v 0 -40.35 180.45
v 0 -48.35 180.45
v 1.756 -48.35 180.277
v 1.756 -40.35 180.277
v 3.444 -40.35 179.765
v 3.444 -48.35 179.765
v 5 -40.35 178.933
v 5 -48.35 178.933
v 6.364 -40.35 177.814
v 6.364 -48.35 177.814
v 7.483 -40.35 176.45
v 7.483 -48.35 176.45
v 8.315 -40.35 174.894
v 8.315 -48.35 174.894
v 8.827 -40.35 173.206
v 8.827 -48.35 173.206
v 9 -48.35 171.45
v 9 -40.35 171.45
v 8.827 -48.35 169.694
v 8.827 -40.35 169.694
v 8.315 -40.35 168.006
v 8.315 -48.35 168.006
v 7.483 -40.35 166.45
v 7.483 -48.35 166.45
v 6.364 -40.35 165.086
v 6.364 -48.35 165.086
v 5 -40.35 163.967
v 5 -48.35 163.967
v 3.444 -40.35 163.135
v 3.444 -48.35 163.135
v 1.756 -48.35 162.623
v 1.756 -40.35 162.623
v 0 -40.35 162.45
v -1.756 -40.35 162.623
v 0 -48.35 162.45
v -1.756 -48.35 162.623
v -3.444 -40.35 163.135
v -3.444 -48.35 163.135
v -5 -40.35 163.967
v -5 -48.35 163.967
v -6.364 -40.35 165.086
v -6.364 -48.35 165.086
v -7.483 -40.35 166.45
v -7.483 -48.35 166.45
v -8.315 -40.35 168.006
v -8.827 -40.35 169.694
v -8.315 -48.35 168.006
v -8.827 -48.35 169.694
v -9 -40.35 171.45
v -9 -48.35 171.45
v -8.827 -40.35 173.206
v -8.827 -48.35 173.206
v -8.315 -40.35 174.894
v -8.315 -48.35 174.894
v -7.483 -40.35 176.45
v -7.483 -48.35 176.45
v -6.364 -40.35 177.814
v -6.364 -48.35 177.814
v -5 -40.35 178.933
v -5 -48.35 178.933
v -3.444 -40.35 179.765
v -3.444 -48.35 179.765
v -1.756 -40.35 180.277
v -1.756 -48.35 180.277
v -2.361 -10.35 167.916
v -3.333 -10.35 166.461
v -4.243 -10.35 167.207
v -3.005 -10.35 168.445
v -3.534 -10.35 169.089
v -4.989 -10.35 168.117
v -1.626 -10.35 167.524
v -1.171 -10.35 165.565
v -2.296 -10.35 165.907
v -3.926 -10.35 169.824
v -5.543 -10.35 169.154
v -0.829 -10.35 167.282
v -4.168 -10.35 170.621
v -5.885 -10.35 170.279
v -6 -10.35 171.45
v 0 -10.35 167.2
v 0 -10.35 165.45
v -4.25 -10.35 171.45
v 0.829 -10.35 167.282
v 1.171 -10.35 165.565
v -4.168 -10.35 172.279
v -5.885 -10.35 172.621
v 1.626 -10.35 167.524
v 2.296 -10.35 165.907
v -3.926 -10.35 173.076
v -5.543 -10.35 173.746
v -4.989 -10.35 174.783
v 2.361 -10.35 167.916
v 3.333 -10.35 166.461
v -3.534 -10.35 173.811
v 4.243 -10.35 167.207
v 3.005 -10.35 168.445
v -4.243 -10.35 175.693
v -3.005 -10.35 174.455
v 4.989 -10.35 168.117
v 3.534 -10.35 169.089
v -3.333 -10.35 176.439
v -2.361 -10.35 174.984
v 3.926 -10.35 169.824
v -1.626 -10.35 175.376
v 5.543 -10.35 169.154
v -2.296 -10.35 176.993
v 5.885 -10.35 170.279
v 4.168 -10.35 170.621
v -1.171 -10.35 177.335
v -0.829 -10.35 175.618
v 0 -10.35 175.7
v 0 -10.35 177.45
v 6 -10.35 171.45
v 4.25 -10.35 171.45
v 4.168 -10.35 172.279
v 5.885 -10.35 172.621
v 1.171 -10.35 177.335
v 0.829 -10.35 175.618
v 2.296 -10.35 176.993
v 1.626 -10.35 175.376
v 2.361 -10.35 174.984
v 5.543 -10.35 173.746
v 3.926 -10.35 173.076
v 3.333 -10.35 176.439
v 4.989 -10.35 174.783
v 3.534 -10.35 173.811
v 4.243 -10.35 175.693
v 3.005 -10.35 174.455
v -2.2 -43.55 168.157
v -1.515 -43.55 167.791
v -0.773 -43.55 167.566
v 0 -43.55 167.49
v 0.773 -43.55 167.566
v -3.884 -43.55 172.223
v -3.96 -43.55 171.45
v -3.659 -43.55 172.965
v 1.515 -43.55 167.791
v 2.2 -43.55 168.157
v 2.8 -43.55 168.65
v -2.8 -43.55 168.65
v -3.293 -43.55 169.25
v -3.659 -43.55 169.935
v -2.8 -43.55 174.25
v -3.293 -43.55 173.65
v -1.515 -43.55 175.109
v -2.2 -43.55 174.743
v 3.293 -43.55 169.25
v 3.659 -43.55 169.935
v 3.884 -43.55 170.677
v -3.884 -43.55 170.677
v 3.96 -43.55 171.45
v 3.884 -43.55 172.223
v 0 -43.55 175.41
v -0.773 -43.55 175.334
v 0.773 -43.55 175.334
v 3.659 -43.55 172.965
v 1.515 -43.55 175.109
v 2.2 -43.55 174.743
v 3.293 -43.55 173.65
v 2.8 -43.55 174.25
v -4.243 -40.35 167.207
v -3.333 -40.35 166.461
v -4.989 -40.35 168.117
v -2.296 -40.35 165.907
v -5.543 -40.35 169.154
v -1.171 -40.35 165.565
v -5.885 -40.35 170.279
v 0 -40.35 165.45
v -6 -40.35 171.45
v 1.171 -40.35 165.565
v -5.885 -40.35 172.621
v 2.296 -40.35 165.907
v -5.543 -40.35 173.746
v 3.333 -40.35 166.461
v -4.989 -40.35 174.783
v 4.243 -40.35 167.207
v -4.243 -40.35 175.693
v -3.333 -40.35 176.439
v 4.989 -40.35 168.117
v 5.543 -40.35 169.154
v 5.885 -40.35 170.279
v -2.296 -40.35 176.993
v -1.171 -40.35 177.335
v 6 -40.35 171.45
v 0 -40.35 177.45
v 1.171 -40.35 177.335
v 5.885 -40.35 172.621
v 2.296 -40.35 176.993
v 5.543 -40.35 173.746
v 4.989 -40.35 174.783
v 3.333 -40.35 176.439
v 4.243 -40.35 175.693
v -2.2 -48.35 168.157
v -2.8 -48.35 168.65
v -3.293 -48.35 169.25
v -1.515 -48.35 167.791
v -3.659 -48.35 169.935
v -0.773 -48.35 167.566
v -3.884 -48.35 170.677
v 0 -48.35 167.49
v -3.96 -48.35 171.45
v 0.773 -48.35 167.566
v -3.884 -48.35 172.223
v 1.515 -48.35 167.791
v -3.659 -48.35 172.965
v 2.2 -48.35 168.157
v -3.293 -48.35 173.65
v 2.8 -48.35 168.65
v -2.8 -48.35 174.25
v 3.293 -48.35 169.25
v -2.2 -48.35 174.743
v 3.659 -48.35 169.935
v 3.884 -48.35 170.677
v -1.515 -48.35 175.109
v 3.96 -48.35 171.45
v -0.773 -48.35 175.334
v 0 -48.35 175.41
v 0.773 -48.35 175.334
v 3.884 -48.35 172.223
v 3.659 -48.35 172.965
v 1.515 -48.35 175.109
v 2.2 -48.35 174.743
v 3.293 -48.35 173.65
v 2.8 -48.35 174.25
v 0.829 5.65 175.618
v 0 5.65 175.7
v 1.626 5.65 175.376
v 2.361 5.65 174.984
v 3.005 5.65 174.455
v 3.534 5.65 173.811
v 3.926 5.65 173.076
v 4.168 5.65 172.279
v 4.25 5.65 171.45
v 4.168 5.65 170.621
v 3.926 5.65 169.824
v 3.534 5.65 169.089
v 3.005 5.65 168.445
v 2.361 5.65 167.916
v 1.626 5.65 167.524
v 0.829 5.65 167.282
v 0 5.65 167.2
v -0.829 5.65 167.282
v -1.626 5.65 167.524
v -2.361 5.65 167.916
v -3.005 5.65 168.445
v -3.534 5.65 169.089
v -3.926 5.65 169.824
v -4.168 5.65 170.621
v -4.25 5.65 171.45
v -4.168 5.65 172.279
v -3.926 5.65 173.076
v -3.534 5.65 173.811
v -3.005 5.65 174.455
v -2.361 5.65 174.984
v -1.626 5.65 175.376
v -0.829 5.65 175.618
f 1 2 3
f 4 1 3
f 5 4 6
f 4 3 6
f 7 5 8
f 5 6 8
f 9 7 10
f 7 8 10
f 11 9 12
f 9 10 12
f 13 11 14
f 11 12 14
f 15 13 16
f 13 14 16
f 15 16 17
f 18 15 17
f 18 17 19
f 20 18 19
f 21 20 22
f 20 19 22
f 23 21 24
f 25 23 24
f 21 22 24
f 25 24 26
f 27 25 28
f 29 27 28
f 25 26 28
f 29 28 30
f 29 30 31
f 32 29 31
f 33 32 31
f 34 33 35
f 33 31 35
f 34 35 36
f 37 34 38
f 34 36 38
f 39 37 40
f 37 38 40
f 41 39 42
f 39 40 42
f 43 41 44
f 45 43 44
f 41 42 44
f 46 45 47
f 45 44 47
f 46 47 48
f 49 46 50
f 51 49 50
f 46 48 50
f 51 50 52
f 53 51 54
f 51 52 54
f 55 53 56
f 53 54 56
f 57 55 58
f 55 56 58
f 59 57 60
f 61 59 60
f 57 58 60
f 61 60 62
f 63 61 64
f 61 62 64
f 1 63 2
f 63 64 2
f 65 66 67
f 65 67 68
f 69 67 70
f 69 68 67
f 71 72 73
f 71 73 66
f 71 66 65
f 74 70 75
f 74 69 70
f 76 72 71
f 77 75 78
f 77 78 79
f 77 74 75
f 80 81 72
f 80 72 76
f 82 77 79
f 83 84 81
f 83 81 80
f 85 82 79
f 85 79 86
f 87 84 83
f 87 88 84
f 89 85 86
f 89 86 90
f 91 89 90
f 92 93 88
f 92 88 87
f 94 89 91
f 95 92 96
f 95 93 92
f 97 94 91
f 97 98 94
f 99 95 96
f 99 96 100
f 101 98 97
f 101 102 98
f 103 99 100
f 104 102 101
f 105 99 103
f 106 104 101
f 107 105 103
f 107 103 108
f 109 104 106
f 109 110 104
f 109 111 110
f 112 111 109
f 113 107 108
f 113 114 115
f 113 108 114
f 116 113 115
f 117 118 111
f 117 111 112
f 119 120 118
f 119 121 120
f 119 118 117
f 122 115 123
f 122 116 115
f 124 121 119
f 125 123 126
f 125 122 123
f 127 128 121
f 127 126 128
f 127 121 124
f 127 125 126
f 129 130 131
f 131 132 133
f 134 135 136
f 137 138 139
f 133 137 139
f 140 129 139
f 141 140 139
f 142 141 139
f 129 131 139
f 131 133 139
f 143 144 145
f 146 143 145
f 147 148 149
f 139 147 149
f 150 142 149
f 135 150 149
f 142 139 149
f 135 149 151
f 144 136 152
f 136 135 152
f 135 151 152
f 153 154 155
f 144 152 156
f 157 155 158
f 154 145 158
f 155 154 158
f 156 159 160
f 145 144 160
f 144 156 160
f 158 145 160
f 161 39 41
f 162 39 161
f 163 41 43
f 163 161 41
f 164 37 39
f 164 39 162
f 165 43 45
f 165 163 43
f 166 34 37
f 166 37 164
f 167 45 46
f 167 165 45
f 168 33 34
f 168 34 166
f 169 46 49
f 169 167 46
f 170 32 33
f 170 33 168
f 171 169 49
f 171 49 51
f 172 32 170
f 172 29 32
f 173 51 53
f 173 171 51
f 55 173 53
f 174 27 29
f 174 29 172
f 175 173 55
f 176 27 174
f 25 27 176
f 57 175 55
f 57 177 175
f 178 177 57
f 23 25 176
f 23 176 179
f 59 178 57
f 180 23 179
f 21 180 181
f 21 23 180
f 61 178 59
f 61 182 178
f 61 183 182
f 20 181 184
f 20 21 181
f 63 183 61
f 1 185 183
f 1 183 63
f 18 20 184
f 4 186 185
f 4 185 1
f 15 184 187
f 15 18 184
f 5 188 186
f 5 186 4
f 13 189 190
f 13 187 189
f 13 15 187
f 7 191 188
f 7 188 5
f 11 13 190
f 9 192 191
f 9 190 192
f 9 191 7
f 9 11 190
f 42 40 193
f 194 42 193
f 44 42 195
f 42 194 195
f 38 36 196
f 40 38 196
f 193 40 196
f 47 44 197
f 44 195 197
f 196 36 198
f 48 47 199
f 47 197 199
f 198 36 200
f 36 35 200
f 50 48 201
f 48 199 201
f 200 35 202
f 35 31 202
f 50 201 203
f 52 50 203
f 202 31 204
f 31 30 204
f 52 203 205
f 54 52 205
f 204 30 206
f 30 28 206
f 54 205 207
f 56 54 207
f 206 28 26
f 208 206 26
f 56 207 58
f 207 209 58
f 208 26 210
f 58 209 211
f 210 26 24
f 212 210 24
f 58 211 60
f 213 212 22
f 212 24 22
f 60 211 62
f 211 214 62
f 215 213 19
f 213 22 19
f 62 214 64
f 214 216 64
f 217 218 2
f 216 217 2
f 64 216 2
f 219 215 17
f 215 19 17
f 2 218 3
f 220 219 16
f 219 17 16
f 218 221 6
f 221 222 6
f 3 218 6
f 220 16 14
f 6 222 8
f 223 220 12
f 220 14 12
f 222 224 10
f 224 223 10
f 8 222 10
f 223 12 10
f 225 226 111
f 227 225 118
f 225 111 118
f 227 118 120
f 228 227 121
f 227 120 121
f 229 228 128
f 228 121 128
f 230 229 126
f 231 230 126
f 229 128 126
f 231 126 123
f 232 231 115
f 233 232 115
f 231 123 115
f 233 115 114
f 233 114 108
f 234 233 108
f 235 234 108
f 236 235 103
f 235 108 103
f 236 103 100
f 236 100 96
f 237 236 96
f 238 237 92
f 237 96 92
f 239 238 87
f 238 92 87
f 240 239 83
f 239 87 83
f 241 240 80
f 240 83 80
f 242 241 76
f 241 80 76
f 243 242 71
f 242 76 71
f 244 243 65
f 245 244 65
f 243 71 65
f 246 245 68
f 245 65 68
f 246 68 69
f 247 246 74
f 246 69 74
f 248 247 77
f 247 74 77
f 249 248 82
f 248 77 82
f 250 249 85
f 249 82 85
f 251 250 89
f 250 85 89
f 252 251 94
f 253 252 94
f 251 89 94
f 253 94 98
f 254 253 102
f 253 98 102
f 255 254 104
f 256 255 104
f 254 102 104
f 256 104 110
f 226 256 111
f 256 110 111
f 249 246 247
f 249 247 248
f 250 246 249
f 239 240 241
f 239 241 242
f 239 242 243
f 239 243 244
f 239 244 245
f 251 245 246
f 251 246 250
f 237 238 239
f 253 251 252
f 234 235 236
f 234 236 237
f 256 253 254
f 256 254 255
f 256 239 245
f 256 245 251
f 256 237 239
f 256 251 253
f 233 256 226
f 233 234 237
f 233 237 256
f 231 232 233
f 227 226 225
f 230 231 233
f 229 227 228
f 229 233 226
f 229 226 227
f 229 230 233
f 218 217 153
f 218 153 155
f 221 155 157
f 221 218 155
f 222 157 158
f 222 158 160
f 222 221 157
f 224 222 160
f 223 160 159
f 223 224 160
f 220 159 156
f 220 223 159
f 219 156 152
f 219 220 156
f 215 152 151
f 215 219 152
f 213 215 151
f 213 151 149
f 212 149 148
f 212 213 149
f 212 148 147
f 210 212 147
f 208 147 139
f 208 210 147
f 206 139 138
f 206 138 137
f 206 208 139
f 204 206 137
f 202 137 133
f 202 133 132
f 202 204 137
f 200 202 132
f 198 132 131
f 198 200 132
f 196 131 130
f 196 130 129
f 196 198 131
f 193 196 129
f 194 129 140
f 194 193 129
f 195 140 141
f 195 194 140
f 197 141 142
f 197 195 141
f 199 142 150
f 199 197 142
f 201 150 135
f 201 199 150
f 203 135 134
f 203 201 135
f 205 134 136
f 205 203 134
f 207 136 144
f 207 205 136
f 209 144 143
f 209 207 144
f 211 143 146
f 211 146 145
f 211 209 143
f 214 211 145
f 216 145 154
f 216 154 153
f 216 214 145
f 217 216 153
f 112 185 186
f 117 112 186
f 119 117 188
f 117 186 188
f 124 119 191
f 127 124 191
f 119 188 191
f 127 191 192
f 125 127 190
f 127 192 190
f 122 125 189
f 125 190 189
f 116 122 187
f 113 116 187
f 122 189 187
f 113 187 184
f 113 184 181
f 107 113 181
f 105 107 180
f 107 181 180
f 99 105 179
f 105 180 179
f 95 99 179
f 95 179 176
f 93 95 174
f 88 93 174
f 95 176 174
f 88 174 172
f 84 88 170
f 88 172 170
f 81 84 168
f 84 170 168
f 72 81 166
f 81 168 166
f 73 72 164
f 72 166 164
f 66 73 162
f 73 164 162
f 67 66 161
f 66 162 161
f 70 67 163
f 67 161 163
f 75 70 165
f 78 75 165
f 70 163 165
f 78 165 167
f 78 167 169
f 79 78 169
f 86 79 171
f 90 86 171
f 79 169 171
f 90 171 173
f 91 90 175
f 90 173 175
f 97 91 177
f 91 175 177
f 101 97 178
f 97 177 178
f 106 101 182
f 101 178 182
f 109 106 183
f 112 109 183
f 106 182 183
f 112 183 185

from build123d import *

# Parameters (mm, degrees)
ROSCA_M10_START  = -10.35
CROQUIS1_R       = 4.25
ROSCA_M10_DEPTH  = 16
HOMBRO_D12_START = -40.35
CROQUIS2_R       = 6
HOMBRO_D12_DEPTH = 30
CABEZA_START     = -48.35
CROQUIS3_R       = 9
CABEZA_DEPTH     = 8
ALLEN_START      = -48.35
CROQUIS4_R       = 3.96
ALLEN_DEPTH      = 4.8


with BuildPart() as part:
    # Croquis1 → Rosca_M10 (new body)
    with BuildSketch(Plane(origin=(0, 0, 0), x_dir=(1, 0, 0), z_dir=(0, 1, 0)).offset(ROSCA_M10_START)):
        with Locations(Location((0, -171.45, 0), (0, 0, 270))):
            Circle(CROQUIS1_R)
    extrude(amount=ROSCA_M10_DEPTH)

    # Croquis2 → Hombro_D12 (add)
    with BuildSketch(Plane(origin=(0, 0, 0), x_dir=(1, 0, 0), z_dir=(0, 1, 0)).offset(HOMBRO_D12_START)):
        with Locations(Location((0, -171.45, 0), (0, 0, 270))):
            Circle(CROQUIS2_R)
    extrude(amount=HOMBRO_D12_DEPTH)

    # Croquis3 → Cabeza (add)
    with BuildSketch(Plane(origin=(0, 0, 0), x_dir=(1, 0, 0), z_dir=(0, 1, 0)).offset(CABEZA_START)):
        with Locations(Location((0, -171.45, 0), (0, 0, 270))):
            Circle(CROQUIS3_R)
    extrude(amount=CABEZA_DEPTH)

    # Croquis4 → Allen (cut)
    with BuildSketch(Plane(origin=(0, 0, 0), x_dir=(1, 0, 0), z_dir=(0, 1, 0)).offset(ALLEN_START)):
        with Locations(Location((0, -171.45, 0), (0, 0, 270))):
            Circle(CROQUIS4_R)
    extrude(amount=ALLEN_DEPTH, mode=Mode.SUBTRACT)


solid = part.part
